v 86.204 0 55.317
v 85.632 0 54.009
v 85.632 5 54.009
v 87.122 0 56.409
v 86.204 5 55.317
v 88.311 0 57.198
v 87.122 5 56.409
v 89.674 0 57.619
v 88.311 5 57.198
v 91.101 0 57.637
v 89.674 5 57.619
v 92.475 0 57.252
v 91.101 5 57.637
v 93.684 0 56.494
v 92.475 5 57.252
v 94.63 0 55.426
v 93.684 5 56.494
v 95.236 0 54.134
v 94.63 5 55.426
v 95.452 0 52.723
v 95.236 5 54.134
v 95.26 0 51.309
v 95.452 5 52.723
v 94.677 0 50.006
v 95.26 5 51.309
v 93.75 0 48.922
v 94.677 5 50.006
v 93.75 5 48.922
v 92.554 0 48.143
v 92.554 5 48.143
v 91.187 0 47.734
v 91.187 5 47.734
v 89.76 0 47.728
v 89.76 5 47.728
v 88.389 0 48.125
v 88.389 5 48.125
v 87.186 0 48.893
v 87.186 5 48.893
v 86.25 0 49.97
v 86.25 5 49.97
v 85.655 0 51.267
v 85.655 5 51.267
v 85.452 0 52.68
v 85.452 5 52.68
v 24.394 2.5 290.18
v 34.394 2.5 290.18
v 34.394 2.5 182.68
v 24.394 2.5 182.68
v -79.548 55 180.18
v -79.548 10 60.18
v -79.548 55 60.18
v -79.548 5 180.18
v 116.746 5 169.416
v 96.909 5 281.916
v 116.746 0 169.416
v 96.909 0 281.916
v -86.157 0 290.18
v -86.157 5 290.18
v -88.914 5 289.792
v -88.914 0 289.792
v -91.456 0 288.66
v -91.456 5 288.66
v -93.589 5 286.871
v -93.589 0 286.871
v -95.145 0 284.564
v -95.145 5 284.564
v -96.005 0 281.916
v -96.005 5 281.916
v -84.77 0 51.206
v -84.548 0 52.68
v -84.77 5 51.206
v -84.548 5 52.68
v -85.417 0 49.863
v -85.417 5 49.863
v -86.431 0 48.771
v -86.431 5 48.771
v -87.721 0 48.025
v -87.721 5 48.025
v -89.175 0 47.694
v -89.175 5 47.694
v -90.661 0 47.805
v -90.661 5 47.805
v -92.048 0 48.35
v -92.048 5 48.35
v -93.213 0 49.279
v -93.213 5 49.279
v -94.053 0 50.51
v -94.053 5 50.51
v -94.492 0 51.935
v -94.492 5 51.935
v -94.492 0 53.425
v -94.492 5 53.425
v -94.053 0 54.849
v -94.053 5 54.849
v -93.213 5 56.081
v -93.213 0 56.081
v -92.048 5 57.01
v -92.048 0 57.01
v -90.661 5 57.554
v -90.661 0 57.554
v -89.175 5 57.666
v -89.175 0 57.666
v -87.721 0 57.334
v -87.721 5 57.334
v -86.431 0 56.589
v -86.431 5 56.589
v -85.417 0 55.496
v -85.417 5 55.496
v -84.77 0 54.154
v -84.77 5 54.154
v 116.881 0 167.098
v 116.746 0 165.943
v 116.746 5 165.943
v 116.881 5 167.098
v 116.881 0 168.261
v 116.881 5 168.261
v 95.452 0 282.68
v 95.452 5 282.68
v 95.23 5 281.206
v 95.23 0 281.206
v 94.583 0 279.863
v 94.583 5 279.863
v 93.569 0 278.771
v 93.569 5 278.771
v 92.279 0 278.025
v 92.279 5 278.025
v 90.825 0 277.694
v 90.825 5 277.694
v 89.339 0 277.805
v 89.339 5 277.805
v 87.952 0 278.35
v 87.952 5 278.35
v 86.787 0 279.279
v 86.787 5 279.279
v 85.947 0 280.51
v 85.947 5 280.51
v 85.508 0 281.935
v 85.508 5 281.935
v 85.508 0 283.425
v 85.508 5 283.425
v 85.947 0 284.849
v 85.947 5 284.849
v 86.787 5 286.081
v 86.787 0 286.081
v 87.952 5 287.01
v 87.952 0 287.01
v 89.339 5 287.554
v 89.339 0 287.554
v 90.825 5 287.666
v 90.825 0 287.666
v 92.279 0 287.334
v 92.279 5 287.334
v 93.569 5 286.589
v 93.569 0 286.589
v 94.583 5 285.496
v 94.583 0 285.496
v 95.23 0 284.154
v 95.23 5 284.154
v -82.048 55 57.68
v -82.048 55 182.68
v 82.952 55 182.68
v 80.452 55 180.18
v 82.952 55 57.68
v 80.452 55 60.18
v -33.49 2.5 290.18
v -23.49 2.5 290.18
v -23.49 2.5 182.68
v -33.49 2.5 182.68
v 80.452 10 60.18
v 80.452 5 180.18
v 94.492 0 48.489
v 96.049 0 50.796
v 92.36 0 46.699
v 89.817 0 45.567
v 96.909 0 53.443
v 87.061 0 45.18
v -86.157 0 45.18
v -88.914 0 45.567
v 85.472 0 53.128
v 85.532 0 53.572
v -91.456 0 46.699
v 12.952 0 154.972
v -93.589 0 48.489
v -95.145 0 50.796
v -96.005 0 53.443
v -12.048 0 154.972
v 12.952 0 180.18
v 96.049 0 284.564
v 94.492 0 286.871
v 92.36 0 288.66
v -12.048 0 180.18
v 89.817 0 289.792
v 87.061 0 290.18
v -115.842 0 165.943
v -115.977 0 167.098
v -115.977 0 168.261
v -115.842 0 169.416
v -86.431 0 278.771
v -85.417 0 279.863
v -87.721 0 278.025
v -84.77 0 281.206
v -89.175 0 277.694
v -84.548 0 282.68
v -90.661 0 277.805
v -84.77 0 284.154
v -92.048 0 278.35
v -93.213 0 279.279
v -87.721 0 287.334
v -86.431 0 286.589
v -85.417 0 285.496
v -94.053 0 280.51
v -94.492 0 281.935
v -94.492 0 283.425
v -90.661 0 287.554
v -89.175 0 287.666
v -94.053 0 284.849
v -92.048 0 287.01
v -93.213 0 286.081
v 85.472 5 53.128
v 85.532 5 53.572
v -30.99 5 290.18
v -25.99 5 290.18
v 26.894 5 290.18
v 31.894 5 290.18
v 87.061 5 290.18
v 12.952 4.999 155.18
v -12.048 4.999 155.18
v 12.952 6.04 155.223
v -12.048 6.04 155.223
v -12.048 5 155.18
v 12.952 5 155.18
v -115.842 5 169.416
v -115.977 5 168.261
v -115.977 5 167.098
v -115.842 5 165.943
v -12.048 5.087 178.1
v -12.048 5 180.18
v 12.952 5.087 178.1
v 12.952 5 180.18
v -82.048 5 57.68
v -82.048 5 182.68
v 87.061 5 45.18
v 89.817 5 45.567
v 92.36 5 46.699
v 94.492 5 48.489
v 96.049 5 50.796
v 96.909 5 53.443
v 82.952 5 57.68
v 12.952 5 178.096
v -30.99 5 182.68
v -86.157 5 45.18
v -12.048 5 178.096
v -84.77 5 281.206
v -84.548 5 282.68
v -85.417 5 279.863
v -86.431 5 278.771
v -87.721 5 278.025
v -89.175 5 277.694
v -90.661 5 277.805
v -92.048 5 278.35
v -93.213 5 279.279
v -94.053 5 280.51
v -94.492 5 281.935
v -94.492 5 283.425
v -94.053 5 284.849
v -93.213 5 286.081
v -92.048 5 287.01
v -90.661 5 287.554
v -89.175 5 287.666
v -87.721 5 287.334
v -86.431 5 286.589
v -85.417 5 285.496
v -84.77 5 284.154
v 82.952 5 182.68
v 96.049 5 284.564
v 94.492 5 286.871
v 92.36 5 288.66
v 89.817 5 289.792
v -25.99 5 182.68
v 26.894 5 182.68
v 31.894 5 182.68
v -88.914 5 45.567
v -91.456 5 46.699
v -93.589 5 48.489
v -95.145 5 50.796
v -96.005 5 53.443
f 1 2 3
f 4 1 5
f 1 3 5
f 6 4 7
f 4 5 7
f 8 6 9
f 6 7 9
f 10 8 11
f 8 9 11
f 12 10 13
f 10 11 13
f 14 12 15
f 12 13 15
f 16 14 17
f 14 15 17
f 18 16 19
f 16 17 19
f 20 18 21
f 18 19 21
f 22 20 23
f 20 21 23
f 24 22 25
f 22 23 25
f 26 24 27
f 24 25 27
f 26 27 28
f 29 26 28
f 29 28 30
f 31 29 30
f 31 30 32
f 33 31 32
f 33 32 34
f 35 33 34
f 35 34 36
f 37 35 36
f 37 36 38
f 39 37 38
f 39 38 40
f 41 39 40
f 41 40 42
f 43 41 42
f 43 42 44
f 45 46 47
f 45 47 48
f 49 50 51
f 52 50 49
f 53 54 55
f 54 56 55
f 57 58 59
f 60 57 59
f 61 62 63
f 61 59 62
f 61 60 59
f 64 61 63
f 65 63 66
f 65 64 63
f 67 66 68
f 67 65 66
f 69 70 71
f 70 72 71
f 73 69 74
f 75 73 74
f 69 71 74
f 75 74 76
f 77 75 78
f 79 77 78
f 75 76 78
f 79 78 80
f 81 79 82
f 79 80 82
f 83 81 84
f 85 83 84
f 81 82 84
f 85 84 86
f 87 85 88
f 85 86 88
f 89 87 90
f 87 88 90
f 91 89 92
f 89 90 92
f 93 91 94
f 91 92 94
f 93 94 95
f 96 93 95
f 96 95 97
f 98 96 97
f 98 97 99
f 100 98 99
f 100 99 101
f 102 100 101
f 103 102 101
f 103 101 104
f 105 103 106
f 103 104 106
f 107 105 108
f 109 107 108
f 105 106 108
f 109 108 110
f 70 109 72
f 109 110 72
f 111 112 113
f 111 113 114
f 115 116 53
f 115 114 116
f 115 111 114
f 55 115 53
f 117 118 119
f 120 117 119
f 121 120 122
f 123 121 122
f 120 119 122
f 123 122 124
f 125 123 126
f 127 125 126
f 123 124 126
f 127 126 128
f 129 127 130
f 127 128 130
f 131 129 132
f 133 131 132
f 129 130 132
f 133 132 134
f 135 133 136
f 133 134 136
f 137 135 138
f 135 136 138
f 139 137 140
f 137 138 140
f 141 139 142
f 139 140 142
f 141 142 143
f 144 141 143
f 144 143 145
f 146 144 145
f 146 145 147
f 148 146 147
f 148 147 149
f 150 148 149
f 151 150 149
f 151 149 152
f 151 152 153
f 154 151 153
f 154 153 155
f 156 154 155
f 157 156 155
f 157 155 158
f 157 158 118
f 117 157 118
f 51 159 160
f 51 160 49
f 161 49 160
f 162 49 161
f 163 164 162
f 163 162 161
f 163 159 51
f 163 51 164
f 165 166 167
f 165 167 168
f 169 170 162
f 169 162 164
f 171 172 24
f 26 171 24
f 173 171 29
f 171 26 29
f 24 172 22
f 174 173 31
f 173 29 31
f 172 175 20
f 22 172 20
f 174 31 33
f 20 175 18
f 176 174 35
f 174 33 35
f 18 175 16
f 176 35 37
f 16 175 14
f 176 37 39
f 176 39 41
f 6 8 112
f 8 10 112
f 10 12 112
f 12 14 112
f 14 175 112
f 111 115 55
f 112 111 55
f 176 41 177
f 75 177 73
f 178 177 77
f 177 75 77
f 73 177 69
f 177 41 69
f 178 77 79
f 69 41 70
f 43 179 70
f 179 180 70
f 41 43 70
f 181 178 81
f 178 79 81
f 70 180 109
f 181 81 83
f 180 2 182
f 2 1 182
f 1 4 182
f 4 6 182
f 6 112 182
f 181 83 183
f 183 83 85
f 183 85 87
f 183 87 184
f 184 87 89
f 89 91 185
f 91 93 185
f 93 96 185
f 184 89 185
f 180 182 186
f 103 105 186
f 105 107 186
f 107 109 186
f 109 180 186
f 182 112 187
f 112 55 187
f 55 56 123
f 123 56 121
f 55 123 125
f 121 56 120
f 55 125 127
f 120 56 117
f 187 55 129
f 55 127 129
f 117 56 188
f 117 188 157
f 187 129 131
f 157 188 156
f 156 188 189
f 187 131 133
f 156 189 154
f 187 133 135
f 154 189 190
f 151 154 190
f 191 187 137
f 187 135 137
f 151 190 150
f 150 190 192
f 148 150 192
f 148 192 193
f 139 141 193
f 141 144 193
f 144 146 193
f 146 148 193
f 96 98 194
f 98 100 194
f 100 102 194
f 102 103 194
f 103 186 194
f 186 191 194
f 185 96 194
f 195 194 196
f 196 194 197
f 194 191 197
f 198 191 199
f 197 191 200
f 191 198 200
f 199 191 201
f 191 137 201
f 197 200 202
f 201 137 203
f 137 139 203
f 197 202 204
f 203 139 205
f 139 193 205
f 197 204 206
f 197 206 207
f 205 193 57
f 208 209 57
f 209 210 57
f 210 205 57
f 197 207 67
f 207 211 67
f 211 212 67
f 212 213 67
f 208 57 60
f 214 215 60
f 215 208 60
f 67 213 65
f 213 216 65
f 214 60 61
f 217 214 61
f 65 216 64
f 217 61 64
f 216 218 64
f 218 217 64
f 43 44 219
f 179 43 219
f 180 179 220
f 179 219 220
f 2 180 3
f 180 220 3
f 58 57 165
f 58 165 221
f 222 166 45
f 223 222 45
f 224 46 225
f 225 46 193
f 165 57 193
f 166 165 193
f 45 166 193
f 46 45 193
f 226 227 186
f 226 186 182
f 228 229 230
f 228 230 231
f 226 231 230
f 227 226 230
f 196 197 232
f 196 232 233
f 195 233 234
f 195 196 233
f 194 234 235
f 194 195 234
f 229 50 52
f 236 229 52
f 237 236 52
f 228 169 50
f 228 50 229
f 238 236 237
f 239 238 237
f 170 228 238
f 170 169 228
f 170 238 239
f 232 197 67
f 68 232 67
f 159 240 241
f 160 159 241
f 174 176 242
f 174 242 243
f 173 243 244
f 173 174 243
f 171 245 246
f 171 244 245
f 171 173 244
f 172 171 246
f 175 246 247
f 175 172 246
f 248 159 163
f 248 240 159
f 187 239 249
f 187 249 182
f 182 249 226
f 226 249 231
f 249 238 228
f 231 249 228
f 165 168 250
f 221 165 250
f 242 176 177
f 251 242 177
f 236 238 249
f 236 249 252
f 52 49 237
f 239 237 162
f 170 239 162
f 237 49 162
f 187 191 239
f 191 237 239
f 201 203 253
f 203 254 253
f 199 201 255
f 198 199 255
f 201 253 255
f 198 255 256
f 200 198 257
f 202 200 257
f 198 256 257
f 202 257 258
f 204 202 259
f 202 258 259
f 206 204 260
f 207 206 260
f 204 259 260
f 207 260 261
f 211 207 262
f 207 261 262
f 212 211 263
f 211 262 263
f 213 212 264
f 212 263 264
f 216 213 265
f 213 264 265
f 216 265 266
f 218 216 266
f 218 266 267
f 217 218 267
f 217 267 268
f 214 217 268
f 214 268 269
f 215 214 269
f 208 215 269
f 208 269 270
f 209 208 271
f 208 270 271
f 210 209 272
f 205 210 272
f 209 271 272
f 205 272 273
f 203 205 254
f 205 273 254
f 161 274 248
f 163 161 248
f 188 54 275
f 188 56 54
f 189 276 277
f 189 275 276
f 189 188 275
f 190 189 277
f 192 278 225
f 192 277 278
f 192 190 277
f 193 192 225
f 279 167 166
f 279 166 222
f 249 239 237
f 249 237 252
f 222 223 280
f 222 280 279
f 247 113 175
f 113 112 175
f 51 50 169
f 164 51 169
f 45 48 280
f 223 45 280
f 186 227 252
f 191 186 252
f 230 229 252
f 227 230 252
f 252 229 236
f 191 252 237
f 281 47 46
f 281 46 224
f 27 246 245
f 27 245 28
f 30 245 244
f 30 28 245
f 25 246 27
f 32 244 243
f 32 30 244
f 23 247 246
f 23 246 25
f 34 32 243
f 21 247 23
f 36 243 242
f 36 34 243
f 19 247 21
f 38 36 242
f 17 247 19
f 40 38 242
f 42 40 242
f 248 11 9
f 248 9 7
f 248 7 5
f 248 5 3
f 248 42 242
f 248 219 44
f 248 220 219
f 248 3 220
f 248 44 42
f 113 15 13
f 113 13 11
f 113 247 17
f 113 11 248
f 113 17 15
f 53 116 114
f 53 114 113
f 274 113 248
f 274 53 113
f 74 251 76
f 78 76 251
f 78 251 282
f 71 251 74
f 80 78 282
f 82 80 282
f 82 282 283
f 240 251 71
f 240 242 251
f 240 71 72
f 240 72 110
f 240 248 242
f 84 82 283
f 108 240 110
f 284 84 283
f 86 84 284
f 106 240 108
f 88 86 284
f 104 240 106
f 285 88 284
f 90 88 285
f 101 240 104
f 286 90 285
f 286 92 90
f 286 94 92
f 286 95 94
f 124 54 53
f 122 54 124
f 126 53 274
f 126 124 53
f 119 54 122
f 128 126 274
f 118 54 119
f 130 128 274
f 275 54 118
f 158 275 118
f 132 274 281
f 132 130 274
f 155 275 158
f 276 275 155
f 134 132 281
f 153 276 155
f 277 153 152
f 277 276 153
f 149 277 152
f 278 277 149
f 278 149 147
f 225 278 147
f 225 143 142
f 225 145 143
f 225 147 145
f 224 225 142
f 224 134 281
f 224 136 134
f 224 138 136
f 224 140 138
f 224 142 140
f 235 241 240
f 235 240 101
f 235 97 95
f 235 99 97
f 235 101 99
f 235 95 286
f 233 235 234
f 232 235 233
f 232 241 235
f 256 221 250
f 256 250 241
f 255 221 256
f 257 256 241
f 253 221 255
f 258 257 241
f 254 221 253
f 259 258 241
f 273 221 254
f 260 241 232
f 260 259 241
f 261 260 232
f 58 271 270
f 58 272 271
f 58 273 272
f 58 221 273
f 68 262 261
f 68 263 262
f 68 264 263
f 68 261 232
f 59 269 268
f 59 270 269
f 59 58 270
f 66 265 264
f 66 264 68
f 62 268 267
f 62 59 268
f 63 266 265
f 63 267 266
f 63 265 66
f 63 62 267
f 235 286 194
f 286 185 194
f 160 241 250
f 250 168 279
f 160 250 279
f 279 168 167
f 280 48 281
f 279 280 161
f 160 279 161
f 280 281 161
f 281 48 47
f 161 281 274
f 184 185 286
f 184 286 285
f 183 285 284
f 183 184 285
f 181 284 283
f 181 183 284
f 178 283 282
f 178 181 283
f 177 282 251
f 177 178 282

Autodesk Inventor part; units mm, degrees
ref_plane "YZ Plane" through (0, 0, 0) normal (1, 0, 0) x (0, 1, 0)
ref_plane "XZ Plane" through (0, 0, 0) normal (0, 1, 0) x (-1, 0, 0)
ref_plane "XY Plane" through (0, 0, 0) normal (0, 0, 1) x (1, 0, 0)
sketch "Sketch1" plane through (0, 0, 0) normal (0, 1, 0) x (-1, 0, 0)
  arc A0 (-85.6318, 54.0093) -> (-85.4518, 52.6798) centre (-90.4518, 52.6798) ccw projected
  line L0 (-85.6318, 54.0093) -> (-85.6318, 82.6798) projected
  line L1 (-85.6318, 82.6798) -> (-75.8236, 82.6798) projected
  line L2 (-75.8236, 82.6798) -> (-75.8236, 52.6798) projected
  line L3 (-75.8236, 52.6798) -> (-85.4518, 52.6798) projected
  circle A1 centre (89.5482, 282.6798) radius 5 projected
  circle A2 centre (-90.4518, 282.6798) radius 5 projected
  circle A3 centre (89.5482, 52.6798) radius 5 projected
  circle A4 centre (-15.4518, 247.6798) radius 5 projected
  circle A5 centre (94.5482, 87.6798) radius 5 projected
  circle A6 centre (-15.4518, 87.6798) radius 5 projected
  circle A7 centre (14.5482, 247.6798) radius 5 projected
  circle A8 centre (-95.4518, 247.6798) radius 5 projected
  circle A9 centre (14.5482, 87.6798) radius 5 projected
  circle A10 centre (-95.4518, 87.6798) radius 5 projected
  circle A11 centre (94.5482, 247.6798) radius 5 projected
  line L4 (-25.6318, 52.6798) -> (-35.3318, 52.6798) projected
  line L5 (-35.3318, 52.6798) -> (-35.3318, 82.6798) projected
  line L6 (-35.3318, 82.6798) -> (-25.6318, 82.6798) projected
  line L7 (-25.6318, 82.6798) -> (-25.6318, 52.6798) projected
  line L8 (24.3682, 82.6798) -> (34.1764, 82.6798) projected
  line L9 (34.1764, 82.6798) -> (34.1764, 52.6798) projected
  line L10 (34.1764, 52.6798) -> (24.3682, 52.6798) projected
  line L11 (24.3682, 52.6798) -> (24.3682, 82.6798) projected
  line L12 (84.3682, 52.6798) -> (74.6682, 52.6798) projected
  line L13 (74.6682, 52.6798) -> (74.6682, 82.6798) projected
  line L14 (74.6682, 82.6798) -> (84.3682, 82.6798) projected
  line L15 (84.3682, 82.6798) -> (84.3682, 52.6798) projected
  arc A12 (86.1572, 45.1798) -> (96.0053, 53.4434) centre (86.1572, 55.1798) ccw projected
  line L16 (96.0053, 53.4434) -> (115.8421, 165.9434) projected
  arc A13 (115.8421, 165.9434) -> (115.8421, 169.4163) centre (105.994, 167.6798) ccw projected
  line L17 (115.8421, 169.4163) -> (96.0053, 281.9163) projected
  arc A14 (96.0053, 281.9163) -> (86.1572, 290.1798) centre (86.1572, 280.1798) ccw projected
  line L18 (86.1572, 290.1798) -> (-87.0608, 290.1798) projected
  arc A15 (-87.0608, 290.1798) -> (-96.9089, 281.9163) centre (-87.0608, 280.1798) ccw projected
  line L19 (-96.9089, 281.9163) -> (-116.7457, 169.4163) projected
  arc A16 (-116.7457, 169.4163) -> (-116.7457, 165.9434) centre (-106.8976, 167.6798) ccw projected
  line L20 (-116.7457, 165.9434) -> (-96.9089, 53.4434) projected
  arc A17 (-96.9089, 53.4434) -> (-87.0608, 45.1798) centre (-87.0608, 55.1798) ccw projected
  line L21 (-87.0608, 45.1798) -> (86.1572, 45.1798) projected
  line L22 (12.0482, 180.1798) -> (12.0482, 155.1798) projected
  line L23 (12.0482, 155.1798) -> (-12.9518, 155.1798) projected
  line L24 (-12.9518, 155.1798) -> (-12.9518, 180.1798) projected
  line L25 (-12.9518, 180.1798) -> (12.0482, 180.1798) projected
  circle A18 centre (25.0482, 100.1798) radius 1.5 projected
  circle A19 centre (25.0482, 230.1798) radius 1.5 projected
  circle A20 centre (-86.9518, 230.1798) radius 1.5 projected
  circle A21 centre (-25.9518, 149.1798) radius 1.5 projected
  circle A22 centre (-25.9518, 100.1798) radius 1.5 projected
  line L26 (-22.4518, 167.6798) -> (-22.4518, 162.6798) projected
  line L27 (-22.4518, 162.6798) -> (-90.4518, 162.6798) projected
  line L28 (-90.4518, 162.6798) -> (-90.4518, 167.6798) projected
  line L29 (-90.4518, 167.6798) -> (-22.4518, 167.6798) projected
  circle A23 centre (-25.9518, 230.1798) radius 1.5 projected
  circle A24 centre (25.0482, 181.1798) radius 1.5 projected
  circle A25 centre (25.0482, 149.1798) radius 1.5 projected
  circle A26 centre (86.0482, 100.1798) radius 1.5 projected
  circle A27 centre (86.0482, 230.1798) radius 1.5 projected
  circle A28 centre (-86.9518, 181.1798) radius 1.5 projected
  circle A29 centre (-86.9518, 149.1798) radius 1.5 projected
  circle A30 centre (-86.9518, 100.1798) radius 1.5 projected
  circle A31 centre (-25.9518, 181.1798) radius 1.5 projected
  line L30 (89.5482, 167.6798) -> (89.5482, 162.6798) projected
  line L31 (89.5482, 162.6798) -> (21.5482, 162.6798) projected
  line L32 (21.5482, 162.6798) -> (21.5482, 167.6798) projected
  line L33 (21.5482, 167.6798) -> (89.5482, 167.6798) projected
  circle A32 centre (86.0482, 181.1798) radius 1.5 projected
  circle A33 centre (86.0482, 149.1798) radius 1.5 projected
  circle A34 centre (-65.4518, 267.6798) radius 4 projected
  circle A35 centre (-65.4518, 67.6798) radius 4 projected
  circle A36 centre (64.5482, 267.6798) radius 4 projected
  circle A37 centre (64.5482, 67.6798) radius 4 projected
  point P0 (0, 0)
extrude "Extrusion1" add sketch "Sketch1" along normal blind 5 contours L0 L1 L2 L3 A0 | A1 | A2 | A3 | A4 | A5 | A6 | A7 | A8 | A9 | A10 | A11 | L4 L5 L6 L7 | L8 L9 L10 L11 | L12 L13 L14 L15 | L21 A17 L20 A16 L19 A15 L18 A14 L17 A13 L16 A12 | L22 L23 L24 L25 | A18 | A19 | A20 | A21 | A22 | L26 L27 L28 L29 | A23 | A24 | A25 | A26 | A27 | A28 | A29 | A30 | A31 | L30 L31 L32 L33 | A32 | A33 | A34 | A35 | A36 | A37
sketch "Sketch2" plane through (0, 5, 0) normal (0, 1, 0) x (1, 0, 0)
  arc A0 (85.6318, -54.0093) -> (85.4518, -52.6798) centre (90.4518, -52.6798) ccw projected
  circle A1 centre (90.4518, -282.6798) radius 5 projected
  circle A2 centre (-89.5482, -52.6798) radius 5 projected
  circle A3 centre (-89.5482, -282.6798) radius 5 projected
  circle A4 centre (90.4518, -52.6798) radius 5
  point P0 (0, 0)
extrude "Extrusion2" cut sketch "Sketch2" against normal through all
sketch "Sketch3" plane through (0, 5, 0) normal (0, 1, 0) x (1, 0, 0)
  line L0 (12.9518, -180.1798) -> (12.9518, -155.1798) projected
  line L1 (12.9518, -155.1798) -> (-12.0482, -155.1798) projected
  line L2 (-12.0482, -155.1798) -> (-12.0482, -180.1798) projected
  line L3 (-12.0482, -180.1798) -> (12.9518, -180.1798) projected
  point P0 (0, 0)
extrude "Extrusion3" cut sketch "Sketch3" against normal mid plane 50
sketch "Sketch4" plane through (0, 5, 0) normal (0, 1, 0) x (1, 0, 0)
  line L0 (-12.0482, -155.1798) -> (-12.0482, -180.1798) projected
  line L1 (-12.0482, -180.1798) -> (82.9518, -180.1798)
  line L2 (82.9518, -180.1798) -> (82.9518, -60.1798)
  line L3 (82.9518, -60.1798) -> (-12.0482, -60.1798)
  line L4 (-12.0482, -60.1798) -> (-12.0482, -180.1798)
  line L5 (12.9518, -180.1798) -> (12.9518, -155.1798) projected
  line L6 (12.9518, -180.1798) -> (-82.0482, -180.1798)
  line L7 (-82.0482, -180.1798) -> (-82.0482, -60.1798)
  line L8 (-82.0482, -60.1798) -> (12.9518, -60.1798)
  line L9 (12.9518, -60.1798) -> (12.9518, -180.1798)
  line L10 (82.9518, -60.1798) -> (-82.0482, -60.1798)
  line L11 (-82.0482, -60.1798) -> (-82.0482, -57.6798)
  line L12 (-82.0482, -57.6798) -> (82.9518, -57.6798)
  line L13 (82.9518, -57.6798) -> (82.9518, -60.1798)
  line L14 (-82.0482, -57.6798) -> (-79.5482, -57.6798)
  line L15 (-79.5482, -57.6798) -> (-79.5482, -180.1798)
  line L16 (-79.5482, -180.1798) -> (-82.0482, -180.1798)
  line L17 (-82.0482, -180.1798) -> (-82.0482, -57.6798)
  line L18 (82.9518, -180.1798) -> (80.4518, -180.1798)
  line L19 (80.4518, -180.1798) -> (80.4518, -57.6798)
  line L20 (80.4518, -57.6798) -> (82.9518, -57.6798)
  line L21 (82.9518, -57.6798) -> (82.9518, -180.1798)
  line L22 (82.9518, -180.1798) -> (-82.0482, -180.1798)
  line L23 (-82.0482, -180.1798) -> (-82.0482, -182.6798)
  line L24 (-82.0482, -182.6798) -> (82.9518, -182.6798)
  line L25 (82.9518, -182.6798) -> (82.9518, -180.1798)
  point P0 (0, 0)
  point P1 (-79.5482, -60.1798)
  point P2 (-12.0482, -60.1798)
  point P3 (80.4518, -60.1798)
  dimension "d6" = 95
  dimension "d7" = 120
  dimension "d8" = 95
  dimension "d9" = 120
  dimension "d10" = 2.5
  dimension "d11" = 2.5
  dimension "d12" = 2.5
  dimension "d13" = 2.5
extrude "Extrusion4" add sketch "Sketch4" along normal blind 50 contours L1 L25 L24 L23 L6 | L8 L15 L12 L19 L3 | L6 L7 L8 L15 | L8 L11 L12 L15 | L19 L3 L2 L1 | L19 L12 L13 L3
sketch "Sketch6" plane through (80.4518, 5, 60.1798) normal (-1, 0, 0) x (0, 0, 1)
  line L0 (122.5, 0) -> (0, 0) projected
  line L1 (122.5, 0) -> (122.5, 50) projected
  line L2 (0, 50) -> (122.5, 50) projected
  line L3 (0, 0) -> (0, 50) projected
  line L4 (120, 0) -> (120, 50) projected
  line L5 (0, 0) -> (0, 50) projected
  line L6 (0, 0) -> (120, 0)
  line L7 (120, 0) -> (120, 5)
  line L8 (120, 5) -> (0, 5)
  line L9 (0, 5) -> (0, 0)
  line L10 (0, 5) -> (120, 0)
  point P0 (-60.1798, -5)
  dimension "d26" = 5
extrude "Extrusion6" add sketch "Sketch6" along normal up to surface (160 mm away) contours L0 L3 L10
sketch "Sketch7" plane through (-79.5482, 10, 60.1798) normal (0, 0.9991, 0.0416) x (1, 0, 0)
  line L0 (67.5, -120.1041) -> (67.5, -95.1258) projected
  line L1 (67.5, -95.1258) -> (92.5, -95.1258) projected
  line L2 (92.5, -95.1258) -> (92.5, -120.1041) projected
  line L3 (160, -118.0226) -> (0, -118.0226) projected
  point P0 (79.5482, 59.7114)
  point P1 (67.5, -118.0226)
  point P2 (92.5, -118.0226)
extrude "Extrusion7" cut sketch "Sketch7" against normal blind 10
sketch "Sketch8" plane through (-86.1572, 0, 290.1798) normal (0, 0, 1) x (1, 0, 0)
  line L0 (0, 0) -> (173.218, 0) projected
  line L1 (173.218, 0) -> (173.218, 5) projected
  line L2 (0, 5) -> (173.218, 5) projected
  line L3 (0, 0) -> (0, 5) projected
  line L4 (173.218, 0) -> (173.218, 5) projected
  line L5 (173.218, 0) -> (115.5513, 0)
  line L6 (115.5513, 0) -> (57.8843, 0)
  line L7 (0, 0) -> (173.218, 0) projected
  line L8 (0, 0) -> (-9.8481, 0) projected
  line L9 (0, 0) -> (57.667, 0)
  line L10 (57.667, 0) -> (57.667, 5)
  line L11 (0, 5) -> (173.218, 5) projected
  line L12 (115.5513, 0) -> (115.5513, 5)
  line L13 (99.109, 5) -> (166.609, 5) projected
  line L14 (55.167, 7.5) -> (60.167, 7.5)
  line L15 (60.167, 7.5) -> (60.167, 2.5)
  line L16 (60.167, 2.5) -> (55.167, 2.5)
  line L17 (55.167, 2.5) -> (55.167, 7.5)
  line L18 (55.167, 7.5) -> (60.167, 2.5) construction
  line L19 (60.167, 7.5) -> (55.167, 2.5) construction
  line L20 (113.0513, 7.5) -> (118.0513, 7.5)
  line L21 (118.0513, 7.5) -> (118.0513, 2.5)
  line L22 (118.0513, 2.5) -> (113.0513, 2.5)
  line L23 (113.0513, 2.5) -> (113.0513, 7.5)
  line L24 (113.0513, 7.5) -> (118.0513, 2.5) construction
  line L25 (118.0513, 7.5) -> (113.0513, 2.5) construction
  line L26 (60.167, 2.5) -> (62.667, 2.5)
  line L27 (62.667, 2.5) -> (60.167, 5)
  line L28 (55.167, 2.5) -> (52.667, 2.5)
  line L29 (52.667, 2.5) -> (55.167, 5)
  line L30 (118.0513, 2.5) -> (120.5513, 2.5)
  line L31 (120.5513, 2.5) -> (118.0513, 5)
  line L32 (113.0513, 2.5) -> (110.5513, 2.5)
  line L33 (110.5513, 2.5) -> (113.0513, 5)
  point P0 (86.1572, 0)
  dimension "d31" = 57.6667
  dimension "d33" = 57.667
  dimension "d34" = 5
  dimension "d35" = 5
  dimension "d36" = 5
  dimension "d37" = 5
  dimension "d38" = 2.5
  dimension "d39" = 2.5
  dimension "d40" = 2.5
  dimension "d41" = 2.5
extrude "Extrusion8" cut sketch "Sketch8" against normal up to surface (107.5 mm away) contours L16 L17 L2 L10 | L10 L2 L15 L16 | L17 L28 L29 | L15 L27 L26 | L22 L23 L2 L12 | L12 L2 L21 L22 | L21 L31 L30 | L32 L33 L23
properties part number "upper base"
